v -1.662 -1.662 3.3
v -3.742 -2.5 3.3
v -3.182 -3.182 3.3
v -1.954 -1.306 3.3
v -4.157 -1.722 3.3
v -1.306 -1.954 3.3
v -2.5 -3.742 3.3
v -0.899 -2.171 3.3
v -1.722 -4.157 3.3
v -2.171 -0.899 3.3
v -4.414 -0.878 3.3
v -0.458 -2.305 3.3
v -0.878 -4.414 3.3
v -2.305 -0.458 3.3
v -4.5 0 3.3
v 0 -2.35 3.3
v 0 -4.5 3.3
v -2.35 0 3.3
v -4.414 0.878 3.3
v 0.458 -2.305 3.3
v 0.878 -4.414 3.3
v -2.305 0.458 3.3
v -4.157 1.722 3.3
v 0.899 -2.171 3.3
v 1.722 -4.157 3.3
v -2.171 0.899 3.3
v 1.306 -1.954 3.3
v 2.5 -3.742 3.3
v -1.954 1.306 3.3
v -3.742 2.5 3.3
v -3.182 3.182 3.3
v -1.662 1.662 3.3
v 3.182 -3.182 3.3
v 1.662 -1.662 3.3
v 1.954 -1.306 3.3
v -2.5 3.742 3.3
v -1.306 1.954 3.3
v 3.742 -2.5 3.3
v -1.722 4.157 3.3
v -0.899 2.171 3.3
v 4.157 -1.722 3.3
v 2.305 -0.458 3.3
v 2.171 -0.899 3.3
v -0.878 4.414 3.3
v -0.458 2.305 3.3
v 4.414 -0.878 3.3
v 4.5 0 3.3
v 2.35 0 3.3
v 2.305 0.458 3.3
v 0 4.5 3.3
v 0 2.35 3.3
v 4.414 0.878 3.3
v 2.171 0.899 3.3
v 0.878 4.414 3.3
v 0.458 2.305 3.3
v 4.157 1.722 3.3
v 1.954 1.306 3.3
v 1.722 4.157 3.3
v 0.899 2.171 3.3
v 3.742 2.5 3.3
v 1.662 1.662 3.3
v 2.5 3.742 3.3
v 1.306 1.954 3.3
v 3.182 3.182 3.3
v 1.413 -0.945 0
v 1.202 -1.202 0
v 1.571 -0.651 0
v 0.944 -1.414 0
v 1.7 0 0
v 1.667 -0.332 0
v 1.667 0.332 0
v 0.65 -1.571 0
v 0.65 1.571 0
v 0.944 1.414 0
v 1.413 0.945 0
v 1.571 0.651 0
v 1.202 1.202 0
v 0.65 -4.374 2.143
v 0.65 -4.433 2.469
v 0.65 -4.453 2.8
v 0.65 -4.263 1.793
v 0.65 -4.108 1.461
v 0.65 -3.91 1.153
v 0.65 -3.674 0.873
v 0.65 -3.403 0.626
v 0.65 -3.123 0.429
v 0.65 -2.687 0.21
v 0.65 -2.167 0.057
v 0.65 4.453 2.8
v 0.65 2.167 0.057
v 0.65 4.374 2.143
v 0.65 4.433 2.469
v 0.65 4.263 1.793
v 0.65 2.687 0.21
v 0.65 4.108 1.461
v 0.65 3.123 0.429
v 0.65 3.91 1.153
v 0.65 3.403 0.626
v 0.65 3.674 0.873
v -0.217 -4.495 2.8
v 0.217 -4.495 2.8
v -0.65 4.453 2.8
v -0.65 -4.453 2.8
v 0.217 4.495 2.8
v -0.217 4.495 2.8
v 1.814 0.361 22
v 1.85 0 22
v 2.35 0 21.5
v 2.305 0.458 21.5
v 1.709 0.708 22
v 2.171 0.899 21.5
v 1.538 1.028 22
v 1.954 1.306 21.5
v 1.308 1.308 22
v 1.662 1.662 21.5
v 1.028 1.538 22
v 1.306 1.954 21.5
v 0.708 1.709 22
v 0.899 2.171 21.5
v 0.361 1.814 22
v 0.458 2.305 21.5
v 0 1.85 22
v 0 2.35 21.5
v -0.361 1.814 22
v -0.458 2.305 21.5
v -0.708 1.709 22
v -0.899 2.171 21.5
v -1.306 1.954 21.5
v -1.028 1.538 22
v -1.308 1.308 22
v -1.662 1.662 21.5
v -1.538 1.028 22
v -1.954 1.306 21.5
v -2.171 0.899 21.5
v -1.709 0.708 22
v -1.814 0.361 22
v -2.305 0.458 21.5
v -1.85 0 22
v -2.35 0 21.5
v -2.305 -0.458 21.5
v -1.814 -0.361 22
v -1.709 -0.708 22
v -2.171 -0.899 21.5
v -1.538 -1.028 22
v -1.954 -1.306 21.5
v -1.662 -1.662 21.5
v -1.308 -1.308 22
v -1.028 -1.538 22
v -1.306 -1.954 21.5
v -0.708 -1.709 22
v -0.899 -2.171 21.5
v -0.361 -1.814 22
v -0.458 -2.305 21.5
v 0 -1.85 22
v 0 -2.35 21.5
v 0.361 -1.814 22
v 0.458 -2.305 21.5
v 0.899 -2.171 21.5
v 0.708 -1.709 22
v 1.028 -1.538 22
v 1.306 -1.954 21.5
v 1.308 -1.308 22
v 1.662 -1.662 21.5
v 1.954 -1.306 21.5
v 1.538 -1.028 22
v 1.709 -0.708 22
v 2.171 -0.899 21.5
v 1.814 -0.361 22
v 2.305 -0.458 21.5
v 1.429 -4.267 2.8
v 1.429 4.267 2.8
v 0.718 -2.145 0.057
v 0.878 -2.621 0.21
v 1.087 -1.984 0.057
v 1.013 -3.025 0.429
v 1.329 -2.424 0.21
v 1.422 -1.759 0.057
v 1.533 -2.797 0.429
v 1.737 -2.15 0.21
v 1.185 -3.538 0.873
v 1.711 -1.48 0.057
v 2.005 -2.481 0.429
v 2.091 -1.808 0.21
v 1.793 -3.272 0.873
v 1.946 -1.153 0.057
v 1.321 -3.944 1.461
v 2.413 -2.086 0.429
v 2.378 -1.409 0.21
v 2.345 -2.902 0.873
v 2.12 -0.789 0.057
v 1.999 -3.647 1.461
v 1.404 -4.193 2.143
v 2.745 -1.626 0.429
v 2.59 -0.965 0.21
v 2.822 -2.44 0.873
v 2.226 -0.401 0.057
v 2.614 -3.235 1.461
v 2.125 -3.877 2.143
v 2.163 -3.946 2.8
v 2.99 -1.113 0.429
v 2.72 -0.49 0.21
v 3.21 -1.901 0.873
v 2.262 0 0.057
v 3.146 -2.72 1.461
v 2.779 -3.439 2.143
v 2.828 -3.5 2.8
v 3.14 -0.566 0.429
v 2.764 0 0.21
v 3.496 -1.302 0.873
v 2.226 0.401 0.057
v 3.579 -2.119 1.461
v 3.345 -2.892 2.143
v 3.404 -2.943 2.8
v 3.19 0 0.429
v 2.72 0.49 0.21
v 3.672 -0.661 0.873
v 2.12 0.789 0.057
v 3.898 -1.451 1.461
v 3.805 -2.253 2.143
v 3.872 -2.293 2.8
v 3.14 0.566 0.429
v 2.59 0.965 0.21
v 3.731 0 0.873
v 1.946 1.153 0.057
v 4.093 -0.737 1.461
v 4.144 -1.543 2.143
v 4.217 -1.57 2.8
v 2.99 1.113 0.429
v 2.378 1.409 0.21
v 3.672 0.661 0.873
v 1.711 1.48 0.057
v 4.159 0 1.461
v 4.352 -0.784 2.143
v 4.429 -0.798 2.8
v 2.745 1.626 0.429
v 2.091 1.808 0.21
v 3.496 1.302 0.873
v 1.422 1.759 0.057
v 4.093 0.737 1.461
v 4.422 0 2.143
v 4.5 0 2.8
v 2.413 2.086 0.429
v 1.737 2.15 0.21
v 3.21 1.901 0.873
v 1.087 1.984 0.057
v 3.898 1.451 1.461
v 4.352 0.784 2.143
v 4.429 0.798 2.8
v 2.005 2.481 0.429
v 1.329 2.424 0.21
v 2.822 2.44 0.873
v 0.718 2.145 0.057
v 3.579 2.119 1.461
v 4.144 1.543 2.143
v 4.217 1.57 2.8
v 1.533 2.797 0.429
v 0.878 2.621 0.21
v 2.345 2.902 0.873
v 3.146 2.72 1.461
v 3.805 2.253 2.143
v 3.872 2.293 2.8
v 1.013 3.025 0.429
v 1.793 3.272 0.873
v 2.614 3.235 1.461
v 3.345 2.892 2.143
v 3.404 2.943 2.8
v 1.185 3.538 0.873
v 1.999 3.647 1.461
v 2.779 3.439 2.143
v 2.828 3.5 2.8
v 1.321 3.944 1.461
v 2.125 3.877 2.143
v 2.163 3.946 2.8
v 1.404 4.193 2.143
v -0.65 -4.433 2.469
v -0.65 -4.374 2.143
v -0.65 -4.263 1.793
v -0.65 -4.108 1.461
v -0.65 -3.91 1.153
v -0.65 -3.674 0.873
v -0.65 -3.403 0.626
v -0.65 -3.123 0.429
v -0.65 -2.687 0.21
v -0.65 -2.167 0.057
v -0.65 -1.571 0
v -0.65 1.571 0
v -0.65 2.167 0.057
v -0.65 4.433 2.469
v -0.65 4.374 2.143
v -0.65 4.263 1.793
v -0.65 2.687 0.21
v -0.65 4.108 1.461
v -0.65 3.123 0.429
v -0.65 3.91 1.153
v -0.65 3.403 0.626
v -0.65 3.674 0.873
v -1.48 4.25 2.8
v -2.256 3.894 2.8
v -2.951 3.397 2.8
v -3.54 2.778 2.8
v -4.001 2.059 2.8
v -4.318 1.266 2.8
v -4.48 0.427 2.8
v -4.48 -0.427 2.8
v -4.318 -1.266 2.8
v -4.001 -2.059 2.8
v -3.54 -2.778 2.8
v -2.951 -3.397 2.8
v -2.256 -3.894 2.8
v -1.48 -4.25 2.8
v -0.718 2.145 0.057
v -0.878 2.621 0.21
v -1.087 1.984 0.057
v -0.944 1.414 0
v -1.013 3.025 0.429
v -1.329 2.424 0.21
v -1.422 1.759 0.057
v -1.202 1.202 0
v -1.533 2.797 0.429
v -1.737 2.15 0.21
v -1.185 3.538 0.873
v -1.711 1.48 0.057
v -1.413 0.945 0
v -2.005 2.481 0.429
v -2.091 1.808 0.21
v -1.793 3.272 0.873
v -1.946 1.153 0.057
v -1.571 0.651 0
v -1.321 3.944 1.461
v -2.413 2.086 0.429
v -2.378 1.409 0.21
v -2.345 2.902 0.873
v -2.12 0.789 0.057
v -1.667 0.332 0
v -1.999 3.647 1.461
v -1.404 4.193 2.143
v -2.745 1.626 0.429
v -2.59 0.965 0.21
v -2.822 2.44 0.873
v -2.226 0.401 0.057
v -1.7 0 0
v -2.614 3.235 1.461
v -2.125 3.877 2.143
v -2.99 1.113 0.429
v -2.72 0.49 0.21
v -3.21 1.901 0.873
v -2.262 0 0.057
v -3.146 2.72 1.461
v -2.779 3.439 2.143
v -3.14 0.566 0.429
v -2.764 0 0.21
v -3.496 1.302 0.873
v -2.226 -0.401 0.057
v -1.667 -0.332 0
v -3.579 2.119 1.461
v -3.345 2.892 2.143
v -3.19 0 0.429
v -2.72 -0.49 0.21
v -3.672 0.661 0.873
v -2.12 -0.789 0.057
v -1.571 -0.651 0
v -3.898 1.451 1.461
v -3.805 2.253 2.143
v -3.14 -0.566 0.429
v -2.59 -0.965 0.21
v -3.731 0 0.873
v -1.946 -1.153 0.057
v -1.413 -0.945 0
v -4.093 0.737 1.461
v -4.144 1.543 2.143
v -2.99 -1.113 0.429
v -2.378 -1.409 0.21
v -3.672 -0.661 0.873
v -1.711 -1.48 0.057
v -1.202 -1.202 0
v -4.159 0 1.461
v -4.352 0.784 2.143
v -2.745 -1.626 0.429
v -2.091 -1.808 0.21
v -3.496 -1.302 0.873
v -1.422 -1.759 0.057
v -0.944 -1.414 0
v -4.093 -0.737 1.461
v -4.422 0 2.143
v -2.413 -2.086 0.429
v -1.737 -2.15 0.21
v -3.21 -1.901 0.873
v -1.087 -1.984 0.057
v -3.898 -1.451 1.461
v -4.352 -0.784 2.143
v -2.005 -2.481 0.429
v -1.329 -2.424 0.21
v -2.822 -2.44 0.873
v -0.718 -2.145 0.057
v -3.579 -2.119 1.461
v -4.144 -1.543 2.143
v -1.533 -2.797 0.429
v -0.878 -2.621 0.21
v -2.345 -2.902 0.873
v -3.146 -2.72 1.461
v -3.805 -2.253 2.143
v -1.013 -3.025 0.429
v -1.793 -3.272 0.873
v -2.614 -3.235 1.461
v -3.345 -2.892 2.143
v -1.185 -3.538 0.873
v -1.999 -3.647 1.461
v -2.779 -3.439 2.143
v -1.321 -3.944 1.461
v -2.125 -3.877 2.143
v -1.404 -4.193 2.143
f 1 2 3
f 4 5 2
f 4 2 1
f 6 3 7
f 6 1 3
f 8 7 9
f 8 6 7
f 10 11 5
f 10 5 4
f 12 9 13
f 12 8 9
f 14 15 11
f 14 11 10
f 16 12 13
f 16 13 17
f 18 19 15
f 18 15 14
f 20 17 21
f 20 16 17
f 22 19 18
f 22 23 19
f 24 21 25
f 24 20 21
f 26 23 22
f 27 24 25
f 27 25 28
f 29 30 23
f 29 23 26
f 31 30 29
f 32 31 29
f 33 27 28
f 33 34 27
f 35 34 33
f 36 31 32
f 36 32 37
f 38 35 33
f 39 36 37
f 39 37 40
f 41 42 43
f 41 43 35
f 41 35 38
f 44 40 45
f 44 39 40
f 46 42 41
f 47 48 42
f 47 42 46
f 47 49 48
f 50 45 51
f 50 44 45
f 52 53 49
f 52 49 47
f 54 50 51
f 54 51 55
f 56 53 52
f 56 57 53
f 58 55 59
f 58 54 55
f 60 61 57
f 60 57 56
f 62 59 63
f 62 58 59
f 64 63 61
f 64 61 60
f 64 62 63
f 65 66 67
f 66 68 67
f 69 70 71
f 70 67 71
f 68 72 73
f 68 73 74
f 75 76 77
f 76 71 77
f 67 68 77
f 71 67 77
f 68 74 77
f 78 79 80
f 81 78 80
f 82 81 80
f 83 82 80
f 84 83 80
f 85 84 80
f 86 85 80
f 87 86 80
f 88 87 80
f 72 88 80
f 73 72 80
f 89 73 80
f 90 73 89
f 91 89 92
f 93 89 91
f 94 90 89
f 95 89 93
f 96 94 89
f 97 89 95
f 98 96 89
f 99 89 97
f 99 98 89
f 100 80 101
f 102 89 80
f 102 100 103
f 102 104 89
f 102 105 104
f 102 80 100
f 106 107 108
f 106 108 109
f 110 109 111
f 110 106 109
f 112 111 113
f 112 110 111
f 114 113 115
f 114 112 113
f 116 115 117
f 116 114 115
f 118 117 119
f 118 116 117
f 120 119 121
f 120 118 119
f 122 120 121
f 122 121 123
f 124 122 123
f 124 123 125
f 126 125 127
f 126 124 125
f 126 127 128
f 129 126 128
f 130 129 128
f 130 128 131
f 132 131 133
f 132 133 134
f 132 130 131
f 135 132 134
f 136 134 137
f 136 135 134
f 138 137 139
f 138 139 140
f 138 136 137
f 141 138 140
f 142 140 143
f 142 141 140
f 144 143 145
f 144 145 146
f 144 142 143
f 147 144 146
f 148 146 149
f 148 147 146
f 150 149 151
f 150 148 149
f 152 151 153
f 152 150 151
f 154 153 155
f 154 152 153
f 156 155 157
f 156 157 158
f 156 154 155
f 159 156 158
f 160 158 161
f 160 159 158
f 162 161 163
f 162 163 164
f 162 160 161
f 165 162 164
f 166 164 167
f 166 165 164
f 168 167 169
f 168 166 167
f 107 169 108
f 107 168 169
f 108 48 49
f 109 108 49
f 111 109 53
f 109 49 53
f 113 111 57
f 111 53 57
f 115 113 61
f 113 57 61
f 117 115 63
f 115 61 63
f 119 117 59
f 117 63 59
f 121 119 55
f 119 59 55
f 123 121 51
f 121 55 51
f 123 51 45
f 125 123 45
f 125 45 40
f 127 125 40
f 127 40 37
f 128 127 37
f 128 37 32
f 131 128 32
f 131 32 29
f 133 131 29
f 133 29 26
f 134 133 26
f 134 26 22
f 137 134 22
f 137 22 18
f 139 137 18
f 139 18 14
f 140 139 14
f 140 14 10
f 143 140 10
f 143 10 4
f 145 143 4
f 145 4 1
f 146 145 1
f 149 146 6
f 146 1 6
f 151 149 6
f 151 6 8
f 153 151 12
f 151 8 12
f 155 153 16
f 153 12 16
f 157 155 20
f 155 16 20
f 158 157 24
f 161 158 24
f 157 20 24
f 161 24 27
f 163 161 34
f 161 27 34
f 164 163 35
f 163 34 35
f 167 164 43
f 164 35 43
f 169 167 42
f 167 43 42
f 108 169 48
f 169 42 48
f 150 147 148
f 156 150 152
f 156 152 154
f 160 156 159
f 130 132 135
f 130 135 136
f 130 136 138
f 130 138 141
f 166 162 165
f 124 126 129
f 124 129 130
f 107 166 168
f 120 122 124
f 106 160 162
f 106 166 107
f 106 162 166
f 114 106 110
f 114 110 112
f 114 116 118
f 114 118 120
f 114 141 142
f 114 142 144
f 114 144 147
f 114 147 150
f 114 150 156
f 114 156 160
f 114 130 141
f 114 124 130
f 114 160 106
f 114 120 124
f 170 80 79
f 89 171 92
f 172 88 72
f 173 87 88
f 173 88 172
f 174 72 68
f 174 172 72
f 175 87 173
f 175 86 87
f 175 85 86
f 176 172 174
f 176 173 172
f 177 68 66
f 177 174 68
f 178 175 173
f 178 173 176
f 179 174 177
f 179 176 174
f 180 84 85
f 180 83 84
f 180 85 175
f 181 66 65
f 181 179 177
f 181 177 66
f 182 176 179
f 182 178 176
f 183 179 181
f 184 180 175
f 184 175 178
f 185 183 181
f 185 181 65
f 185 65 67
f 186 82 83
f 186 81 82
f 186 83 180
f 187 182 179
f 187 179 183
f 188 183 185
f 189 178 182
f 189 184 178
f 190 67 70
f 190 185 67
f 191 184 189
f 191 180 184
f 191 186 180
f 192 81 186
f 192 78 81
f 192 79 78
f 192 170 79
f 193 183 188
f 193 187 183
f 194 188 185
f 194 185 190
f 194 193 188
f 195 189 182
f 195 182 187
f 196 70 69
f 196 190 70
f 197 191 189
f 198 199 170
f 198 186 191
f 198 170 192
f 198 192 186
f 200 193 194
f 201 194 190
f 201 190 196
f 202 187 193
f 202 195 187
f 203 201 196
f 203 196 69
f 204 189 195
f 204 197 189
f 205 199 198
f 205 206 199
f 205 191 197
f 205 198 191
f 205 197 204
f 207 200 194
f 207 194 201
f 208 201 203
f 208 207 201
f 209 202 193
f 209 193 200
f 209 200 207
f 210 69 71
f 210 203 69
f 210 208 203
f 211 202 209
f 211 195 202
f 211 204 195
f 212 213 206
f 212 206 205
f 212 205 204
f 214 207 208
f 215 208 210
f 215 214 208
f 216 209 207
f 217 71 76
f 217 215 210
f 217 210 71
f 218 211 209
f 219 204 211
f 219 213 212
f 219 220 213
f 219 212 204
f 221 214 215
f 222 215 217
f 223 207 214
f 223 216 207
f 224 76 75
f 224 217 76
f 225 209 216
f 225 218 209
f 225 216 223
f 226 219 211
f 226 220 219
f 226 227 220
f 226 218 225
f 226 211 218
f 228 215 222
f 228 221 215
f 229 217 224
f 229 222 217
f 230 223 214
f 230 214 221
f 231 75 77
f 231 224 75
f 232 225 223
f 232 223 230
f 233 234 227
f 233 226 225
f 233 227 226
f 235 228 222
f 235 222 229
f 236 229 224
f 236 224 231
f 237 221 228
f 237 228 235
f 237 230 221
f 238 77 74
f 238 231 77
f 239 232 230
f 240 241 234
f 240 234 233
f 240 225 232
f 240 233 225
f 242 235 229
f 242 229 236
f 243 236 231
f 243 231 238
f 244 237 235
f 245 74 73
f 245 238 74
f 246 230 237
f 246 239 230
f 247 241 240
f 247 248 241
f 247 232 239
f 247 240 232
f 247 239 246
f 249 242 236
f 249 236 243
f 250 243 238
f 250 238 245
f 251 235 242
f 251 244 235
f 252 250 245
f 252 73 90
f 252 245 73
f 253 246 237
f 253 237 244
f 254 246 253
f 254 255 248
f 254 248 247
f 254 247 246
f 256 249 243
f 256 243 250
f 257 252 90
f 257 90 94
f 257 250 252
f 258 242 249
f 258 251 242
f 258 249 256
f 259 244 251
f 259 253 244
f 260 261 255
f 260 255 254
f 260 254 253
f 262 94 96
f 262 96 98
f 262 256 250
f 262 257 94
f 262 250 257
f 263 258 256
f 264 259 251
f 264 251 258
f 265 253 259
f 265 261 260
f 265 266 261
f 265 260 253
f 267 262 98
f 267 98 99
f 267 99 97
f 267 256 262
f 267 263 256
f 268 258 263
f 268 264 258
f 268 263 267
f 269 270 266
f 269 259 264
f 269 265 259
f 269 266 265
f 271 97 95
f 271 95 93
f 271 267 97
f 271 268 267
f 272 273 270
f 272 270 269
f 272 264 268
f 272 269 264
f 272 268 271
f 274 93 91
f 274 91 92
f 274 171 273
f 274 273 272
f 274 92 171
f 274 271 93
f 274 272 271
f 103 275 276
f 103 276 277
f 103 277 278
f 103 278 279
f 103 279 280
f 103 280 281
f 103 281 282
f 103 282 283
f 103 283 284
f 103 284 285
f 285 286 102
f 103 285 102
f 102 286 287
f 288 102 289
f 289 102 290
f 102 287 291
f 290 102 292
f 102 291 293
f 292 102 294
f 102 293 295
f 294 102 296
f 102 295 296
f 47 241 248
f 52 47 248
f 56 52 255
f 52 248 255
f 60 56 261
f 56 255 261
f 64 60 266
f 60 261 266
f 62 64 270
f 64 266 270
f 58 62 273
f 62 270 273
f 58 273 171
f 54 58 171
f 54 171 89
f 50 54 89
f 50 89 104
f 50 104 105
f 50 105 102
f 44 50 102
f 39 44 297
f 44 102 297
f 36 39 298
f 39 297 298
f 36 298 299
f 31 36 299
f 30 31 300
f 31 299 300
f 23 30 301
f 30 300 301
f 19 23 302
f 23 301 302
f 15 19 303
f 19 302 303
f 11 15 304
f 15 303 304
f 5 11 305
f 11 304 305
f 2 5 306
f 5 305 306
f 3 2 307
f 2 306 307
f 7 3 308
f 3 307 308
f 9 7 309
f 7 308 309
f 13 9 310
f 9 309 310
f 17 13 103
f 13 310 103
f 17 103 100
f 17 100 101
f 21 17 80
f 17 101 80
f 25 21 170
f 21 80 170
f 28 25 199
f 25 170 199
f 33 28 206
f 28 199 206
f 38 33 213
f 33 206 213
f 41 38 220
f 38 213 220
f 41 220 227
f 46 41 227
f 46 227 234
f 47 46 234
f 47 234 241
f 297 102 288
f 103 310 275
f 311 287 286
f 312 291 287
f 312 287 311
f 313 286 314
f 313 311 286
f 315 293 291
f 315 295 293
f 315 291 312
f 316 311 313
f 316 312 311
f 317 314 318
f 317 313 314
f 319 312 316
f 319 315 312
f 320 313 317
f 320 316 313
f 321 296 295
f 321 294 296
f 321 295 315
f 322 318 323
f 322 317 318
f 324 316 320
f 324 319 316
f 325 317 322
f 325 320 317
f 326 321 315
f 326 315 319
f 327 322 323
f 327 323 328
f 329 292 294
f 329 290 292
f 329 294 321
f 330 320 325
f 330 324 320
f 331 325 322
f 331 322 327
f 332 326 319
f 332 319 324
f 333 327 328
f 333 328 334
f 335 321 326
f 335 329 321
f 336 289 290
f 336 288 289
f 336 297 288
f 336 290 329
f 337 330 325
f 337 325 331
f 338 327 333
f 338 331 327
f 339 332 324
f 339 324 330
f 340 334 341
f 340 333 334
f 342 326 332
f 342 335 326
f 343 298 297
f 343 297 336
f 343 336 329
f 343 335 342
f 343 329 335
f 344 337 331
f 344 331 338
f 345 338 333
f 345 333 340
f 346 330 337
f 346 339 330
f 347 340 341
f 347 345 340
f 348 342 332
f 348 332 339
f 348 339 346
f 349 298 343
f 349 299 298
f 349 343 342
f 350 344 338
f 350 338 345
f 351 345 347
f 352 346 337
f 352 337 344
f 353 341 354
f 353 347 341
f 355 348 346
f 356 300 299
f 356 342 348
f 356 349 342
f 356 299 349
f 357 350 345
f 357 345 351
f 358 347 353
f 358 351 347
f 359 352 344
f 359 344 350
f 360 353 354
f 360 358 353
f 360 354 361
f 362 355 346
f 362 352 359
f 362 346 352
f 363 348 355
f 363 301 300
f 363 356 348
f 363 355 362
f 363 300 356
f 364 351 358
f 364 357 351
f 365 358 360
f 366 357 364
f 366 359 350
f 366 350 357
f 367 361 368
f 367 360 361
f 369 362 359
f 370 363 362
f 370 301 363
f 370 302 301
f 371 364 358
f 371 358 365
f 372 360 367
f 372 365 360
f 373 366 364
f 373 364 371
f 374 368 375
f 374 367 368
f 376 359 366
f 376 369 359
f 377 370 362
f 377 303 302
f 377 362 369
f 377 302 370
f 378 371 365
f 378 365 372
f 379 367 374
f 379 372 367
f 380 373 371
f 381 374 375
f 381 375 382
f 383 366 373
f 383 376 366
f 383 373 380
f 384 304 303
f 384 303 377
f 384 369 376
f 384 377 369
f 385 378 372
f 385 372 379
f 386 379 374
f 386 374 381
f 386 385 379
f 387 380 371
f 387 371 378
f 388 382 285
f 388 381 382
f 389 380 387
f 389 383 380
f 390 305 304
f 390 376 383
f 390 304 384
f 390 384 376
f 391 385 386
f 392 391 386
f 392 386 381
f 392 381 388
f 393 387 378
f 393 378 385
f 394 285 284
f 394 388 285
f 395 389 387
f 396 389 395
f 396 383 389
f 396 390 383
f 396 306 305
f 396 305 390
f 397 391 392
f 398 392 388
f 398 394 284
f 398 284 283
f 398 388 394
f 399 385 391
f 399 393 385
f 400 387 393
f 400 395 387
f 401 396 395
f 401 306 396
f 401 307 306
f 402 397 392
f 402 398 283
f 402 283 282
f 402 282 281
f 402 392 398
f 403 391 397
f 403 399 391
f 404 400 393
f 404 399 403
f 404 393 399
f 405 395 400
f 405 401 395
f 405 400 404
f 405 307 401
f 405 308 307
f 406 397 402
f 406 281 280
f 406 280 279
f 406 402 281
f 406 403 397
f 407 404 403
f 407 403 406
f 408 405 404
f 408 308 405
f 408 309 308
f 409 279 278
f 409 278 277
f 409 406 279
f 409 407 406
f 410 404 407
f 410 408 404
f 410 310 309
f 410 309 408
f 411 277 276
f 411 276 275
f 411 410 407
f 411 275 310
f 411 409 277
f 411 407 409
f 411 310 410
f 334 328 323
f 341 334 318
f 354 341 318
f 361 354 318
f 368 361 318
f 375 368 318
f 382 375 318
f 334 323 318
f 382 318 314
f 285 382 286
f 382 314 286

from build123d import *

# Parameters (mm, degrees)
ESBO_O1_R                = 4.5
RESSALTO_EXTRUS_O1_DEPTH = 3.3
ESBO_O2_R                = 2.35
RESSALTO_EXTRUS_O2_DEPTH = 22
FILETE1_R                = 2.8
ESBO_O3_W                = 1.3
ESBO_O3_H                = 10.03421546
CORTE_EXTRUS_O1_DEPTH    = 2.8
CHANFRO1_SIZE            = 0.5


with BuildPart() as part:
    # Esboço1 → Ressalto-extrusão1 (new body)
    with BuildSketch(Plane.XY):
        Circle(ESBO_O1_R)
    extrude(amount=RESSALTO_EXTRUS_O1_DEPTH)

    # Esboço2 → Ressalto-extrusão2 (add)
    with BuildSketch(Plane.XY):
        Circle(ESBO_O2_R)
    extrude(amount=RESSALTO_EXTRUS_O2_DEPTH)

    # Filete1
    filete1_edges = [part.edges().sort_by_distance(p)[0] for p in [
        (-4.5, 0, 0),
    ]]
    fillet(filete1_edges, radius=FILETE1_R)

    # Esboço3 → Corte-extrusão1 (cut)
    with BuildSketch(Plane(origin=(0, 0, 0), x_dir=(-1, 0, 0), z_dir=(0, 0, -1))):
        Rectangle(ESBO_O3_W, ESBO_O3_H)
    extrude(amount=-CORTE_EXTRUS_O1_DEPTH, mode=Mode.SUBTRACT)

    # Chanfro1
    chanfro1_edges = [part.edges().sort_by_distance(p)[0] for p in [
        (-2.35, 0, 22),
    ]]
    chamfer(chanfro1_edges, length=CHANFRO1_SIZE)


solid = part.part
